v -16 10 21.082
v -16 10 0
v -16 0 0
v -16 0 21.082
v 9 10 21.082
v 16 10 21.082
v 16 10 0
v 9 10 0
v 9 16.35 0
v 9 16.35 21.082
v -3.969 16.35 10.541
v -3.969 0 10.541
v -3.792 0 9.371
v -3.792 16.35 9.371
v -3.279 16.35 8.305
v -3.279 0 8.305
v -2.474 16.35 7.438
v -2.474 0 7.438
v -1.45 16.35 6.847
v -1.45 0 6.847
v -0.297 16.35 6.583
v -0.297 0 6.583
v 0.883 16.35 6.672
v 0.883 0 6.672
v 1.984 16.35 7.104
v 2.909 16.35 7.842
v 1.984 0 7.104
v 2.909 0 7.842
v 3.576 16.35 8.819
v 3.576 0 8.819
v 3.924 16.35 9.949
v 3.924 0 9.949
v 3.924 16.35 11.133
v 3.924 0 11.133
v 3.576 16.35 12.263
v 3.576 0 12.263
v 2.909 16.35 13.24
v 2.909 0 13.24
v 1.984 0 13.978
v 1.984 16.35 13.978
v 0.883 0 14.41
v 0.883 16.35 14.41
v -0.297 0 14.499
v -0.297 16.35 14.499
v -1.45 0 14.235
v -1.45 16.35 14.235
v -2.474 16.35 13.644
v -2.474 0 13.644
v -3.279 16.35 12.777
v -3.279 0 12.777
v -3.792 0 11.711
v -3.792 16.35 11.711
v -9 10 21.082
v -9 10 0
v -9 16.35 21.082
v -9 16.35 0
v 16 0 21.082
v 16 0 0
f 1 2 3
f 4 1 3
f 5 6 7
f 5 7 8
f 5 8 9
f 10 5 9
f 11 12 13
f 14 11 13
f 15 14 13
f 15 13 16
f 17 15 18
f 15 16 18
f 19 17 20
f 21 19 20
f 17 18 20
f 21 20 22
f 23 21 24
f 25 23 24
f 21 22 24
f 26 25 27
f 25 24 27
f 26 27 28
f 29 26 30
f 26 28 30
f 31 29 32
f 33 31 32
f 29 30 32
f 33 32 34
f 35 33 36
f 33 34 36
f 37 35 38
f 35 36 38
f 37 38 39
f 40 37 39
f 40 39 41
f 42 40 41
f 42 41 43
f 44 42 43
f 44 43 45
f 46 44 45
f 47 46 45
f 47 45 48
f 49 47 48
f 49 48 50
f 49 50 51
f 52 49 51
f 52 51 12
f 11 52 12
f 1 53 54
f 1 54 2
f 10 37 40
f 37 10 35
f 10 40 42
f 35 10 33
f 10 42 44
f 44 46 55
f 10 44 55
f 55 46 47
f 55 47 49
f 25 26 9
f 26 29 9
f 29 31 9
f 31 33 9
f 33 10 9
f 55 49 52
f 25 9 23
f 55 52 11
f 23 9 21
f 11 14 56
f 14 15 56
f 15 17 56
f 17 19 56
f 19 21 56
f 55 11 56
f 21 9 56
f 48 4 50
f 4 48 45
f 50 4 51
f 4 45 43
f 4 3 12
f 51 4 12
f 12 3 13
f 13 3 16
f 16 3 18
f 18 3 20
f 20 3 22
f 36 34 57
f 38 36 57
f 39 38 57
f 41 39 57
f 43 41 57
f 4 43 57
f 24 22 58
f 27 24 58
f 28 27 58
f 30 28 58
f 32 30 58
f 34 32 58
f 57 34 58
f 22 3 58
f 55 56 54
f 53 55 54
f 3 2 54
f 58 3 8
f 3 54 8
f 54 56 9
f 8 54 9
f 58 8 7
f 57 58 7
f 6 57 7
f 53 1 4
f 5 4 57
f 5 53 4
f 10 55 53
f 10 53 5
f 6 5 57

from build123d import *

# Parameters (mm, degrees)
BOSS_EXTRUDE1_DEPTH     = 21.082
F_3_8_16_TAPPED_HOLE1_D = 7.9375


with BuildPart() as part:
    # Sketch1 → Boss-Extrude1 (new body)
    with BuildSketch(Plane.XY):
        Polygon((-16, 0), (16, 0), (16, 10), (9, 10), (9, 16.35), (-9, 16.35), (-9, 10), (-16, 10), align=None)
    extrude(amount=BOSS_EXTRUDE1_DEPTH)

    # 3/8-16 Tapped Hole1 (through all)
    with Locations(Plane(origin=(0, 16.35, 0), x_dir=(1, 0, 0), z_dir=(0, 1, 0))):
        with Locations((0, -10.541)):
            Hole(F_3_8_16_TAPPED_HOLE1_D / 2)


solid = part.part
